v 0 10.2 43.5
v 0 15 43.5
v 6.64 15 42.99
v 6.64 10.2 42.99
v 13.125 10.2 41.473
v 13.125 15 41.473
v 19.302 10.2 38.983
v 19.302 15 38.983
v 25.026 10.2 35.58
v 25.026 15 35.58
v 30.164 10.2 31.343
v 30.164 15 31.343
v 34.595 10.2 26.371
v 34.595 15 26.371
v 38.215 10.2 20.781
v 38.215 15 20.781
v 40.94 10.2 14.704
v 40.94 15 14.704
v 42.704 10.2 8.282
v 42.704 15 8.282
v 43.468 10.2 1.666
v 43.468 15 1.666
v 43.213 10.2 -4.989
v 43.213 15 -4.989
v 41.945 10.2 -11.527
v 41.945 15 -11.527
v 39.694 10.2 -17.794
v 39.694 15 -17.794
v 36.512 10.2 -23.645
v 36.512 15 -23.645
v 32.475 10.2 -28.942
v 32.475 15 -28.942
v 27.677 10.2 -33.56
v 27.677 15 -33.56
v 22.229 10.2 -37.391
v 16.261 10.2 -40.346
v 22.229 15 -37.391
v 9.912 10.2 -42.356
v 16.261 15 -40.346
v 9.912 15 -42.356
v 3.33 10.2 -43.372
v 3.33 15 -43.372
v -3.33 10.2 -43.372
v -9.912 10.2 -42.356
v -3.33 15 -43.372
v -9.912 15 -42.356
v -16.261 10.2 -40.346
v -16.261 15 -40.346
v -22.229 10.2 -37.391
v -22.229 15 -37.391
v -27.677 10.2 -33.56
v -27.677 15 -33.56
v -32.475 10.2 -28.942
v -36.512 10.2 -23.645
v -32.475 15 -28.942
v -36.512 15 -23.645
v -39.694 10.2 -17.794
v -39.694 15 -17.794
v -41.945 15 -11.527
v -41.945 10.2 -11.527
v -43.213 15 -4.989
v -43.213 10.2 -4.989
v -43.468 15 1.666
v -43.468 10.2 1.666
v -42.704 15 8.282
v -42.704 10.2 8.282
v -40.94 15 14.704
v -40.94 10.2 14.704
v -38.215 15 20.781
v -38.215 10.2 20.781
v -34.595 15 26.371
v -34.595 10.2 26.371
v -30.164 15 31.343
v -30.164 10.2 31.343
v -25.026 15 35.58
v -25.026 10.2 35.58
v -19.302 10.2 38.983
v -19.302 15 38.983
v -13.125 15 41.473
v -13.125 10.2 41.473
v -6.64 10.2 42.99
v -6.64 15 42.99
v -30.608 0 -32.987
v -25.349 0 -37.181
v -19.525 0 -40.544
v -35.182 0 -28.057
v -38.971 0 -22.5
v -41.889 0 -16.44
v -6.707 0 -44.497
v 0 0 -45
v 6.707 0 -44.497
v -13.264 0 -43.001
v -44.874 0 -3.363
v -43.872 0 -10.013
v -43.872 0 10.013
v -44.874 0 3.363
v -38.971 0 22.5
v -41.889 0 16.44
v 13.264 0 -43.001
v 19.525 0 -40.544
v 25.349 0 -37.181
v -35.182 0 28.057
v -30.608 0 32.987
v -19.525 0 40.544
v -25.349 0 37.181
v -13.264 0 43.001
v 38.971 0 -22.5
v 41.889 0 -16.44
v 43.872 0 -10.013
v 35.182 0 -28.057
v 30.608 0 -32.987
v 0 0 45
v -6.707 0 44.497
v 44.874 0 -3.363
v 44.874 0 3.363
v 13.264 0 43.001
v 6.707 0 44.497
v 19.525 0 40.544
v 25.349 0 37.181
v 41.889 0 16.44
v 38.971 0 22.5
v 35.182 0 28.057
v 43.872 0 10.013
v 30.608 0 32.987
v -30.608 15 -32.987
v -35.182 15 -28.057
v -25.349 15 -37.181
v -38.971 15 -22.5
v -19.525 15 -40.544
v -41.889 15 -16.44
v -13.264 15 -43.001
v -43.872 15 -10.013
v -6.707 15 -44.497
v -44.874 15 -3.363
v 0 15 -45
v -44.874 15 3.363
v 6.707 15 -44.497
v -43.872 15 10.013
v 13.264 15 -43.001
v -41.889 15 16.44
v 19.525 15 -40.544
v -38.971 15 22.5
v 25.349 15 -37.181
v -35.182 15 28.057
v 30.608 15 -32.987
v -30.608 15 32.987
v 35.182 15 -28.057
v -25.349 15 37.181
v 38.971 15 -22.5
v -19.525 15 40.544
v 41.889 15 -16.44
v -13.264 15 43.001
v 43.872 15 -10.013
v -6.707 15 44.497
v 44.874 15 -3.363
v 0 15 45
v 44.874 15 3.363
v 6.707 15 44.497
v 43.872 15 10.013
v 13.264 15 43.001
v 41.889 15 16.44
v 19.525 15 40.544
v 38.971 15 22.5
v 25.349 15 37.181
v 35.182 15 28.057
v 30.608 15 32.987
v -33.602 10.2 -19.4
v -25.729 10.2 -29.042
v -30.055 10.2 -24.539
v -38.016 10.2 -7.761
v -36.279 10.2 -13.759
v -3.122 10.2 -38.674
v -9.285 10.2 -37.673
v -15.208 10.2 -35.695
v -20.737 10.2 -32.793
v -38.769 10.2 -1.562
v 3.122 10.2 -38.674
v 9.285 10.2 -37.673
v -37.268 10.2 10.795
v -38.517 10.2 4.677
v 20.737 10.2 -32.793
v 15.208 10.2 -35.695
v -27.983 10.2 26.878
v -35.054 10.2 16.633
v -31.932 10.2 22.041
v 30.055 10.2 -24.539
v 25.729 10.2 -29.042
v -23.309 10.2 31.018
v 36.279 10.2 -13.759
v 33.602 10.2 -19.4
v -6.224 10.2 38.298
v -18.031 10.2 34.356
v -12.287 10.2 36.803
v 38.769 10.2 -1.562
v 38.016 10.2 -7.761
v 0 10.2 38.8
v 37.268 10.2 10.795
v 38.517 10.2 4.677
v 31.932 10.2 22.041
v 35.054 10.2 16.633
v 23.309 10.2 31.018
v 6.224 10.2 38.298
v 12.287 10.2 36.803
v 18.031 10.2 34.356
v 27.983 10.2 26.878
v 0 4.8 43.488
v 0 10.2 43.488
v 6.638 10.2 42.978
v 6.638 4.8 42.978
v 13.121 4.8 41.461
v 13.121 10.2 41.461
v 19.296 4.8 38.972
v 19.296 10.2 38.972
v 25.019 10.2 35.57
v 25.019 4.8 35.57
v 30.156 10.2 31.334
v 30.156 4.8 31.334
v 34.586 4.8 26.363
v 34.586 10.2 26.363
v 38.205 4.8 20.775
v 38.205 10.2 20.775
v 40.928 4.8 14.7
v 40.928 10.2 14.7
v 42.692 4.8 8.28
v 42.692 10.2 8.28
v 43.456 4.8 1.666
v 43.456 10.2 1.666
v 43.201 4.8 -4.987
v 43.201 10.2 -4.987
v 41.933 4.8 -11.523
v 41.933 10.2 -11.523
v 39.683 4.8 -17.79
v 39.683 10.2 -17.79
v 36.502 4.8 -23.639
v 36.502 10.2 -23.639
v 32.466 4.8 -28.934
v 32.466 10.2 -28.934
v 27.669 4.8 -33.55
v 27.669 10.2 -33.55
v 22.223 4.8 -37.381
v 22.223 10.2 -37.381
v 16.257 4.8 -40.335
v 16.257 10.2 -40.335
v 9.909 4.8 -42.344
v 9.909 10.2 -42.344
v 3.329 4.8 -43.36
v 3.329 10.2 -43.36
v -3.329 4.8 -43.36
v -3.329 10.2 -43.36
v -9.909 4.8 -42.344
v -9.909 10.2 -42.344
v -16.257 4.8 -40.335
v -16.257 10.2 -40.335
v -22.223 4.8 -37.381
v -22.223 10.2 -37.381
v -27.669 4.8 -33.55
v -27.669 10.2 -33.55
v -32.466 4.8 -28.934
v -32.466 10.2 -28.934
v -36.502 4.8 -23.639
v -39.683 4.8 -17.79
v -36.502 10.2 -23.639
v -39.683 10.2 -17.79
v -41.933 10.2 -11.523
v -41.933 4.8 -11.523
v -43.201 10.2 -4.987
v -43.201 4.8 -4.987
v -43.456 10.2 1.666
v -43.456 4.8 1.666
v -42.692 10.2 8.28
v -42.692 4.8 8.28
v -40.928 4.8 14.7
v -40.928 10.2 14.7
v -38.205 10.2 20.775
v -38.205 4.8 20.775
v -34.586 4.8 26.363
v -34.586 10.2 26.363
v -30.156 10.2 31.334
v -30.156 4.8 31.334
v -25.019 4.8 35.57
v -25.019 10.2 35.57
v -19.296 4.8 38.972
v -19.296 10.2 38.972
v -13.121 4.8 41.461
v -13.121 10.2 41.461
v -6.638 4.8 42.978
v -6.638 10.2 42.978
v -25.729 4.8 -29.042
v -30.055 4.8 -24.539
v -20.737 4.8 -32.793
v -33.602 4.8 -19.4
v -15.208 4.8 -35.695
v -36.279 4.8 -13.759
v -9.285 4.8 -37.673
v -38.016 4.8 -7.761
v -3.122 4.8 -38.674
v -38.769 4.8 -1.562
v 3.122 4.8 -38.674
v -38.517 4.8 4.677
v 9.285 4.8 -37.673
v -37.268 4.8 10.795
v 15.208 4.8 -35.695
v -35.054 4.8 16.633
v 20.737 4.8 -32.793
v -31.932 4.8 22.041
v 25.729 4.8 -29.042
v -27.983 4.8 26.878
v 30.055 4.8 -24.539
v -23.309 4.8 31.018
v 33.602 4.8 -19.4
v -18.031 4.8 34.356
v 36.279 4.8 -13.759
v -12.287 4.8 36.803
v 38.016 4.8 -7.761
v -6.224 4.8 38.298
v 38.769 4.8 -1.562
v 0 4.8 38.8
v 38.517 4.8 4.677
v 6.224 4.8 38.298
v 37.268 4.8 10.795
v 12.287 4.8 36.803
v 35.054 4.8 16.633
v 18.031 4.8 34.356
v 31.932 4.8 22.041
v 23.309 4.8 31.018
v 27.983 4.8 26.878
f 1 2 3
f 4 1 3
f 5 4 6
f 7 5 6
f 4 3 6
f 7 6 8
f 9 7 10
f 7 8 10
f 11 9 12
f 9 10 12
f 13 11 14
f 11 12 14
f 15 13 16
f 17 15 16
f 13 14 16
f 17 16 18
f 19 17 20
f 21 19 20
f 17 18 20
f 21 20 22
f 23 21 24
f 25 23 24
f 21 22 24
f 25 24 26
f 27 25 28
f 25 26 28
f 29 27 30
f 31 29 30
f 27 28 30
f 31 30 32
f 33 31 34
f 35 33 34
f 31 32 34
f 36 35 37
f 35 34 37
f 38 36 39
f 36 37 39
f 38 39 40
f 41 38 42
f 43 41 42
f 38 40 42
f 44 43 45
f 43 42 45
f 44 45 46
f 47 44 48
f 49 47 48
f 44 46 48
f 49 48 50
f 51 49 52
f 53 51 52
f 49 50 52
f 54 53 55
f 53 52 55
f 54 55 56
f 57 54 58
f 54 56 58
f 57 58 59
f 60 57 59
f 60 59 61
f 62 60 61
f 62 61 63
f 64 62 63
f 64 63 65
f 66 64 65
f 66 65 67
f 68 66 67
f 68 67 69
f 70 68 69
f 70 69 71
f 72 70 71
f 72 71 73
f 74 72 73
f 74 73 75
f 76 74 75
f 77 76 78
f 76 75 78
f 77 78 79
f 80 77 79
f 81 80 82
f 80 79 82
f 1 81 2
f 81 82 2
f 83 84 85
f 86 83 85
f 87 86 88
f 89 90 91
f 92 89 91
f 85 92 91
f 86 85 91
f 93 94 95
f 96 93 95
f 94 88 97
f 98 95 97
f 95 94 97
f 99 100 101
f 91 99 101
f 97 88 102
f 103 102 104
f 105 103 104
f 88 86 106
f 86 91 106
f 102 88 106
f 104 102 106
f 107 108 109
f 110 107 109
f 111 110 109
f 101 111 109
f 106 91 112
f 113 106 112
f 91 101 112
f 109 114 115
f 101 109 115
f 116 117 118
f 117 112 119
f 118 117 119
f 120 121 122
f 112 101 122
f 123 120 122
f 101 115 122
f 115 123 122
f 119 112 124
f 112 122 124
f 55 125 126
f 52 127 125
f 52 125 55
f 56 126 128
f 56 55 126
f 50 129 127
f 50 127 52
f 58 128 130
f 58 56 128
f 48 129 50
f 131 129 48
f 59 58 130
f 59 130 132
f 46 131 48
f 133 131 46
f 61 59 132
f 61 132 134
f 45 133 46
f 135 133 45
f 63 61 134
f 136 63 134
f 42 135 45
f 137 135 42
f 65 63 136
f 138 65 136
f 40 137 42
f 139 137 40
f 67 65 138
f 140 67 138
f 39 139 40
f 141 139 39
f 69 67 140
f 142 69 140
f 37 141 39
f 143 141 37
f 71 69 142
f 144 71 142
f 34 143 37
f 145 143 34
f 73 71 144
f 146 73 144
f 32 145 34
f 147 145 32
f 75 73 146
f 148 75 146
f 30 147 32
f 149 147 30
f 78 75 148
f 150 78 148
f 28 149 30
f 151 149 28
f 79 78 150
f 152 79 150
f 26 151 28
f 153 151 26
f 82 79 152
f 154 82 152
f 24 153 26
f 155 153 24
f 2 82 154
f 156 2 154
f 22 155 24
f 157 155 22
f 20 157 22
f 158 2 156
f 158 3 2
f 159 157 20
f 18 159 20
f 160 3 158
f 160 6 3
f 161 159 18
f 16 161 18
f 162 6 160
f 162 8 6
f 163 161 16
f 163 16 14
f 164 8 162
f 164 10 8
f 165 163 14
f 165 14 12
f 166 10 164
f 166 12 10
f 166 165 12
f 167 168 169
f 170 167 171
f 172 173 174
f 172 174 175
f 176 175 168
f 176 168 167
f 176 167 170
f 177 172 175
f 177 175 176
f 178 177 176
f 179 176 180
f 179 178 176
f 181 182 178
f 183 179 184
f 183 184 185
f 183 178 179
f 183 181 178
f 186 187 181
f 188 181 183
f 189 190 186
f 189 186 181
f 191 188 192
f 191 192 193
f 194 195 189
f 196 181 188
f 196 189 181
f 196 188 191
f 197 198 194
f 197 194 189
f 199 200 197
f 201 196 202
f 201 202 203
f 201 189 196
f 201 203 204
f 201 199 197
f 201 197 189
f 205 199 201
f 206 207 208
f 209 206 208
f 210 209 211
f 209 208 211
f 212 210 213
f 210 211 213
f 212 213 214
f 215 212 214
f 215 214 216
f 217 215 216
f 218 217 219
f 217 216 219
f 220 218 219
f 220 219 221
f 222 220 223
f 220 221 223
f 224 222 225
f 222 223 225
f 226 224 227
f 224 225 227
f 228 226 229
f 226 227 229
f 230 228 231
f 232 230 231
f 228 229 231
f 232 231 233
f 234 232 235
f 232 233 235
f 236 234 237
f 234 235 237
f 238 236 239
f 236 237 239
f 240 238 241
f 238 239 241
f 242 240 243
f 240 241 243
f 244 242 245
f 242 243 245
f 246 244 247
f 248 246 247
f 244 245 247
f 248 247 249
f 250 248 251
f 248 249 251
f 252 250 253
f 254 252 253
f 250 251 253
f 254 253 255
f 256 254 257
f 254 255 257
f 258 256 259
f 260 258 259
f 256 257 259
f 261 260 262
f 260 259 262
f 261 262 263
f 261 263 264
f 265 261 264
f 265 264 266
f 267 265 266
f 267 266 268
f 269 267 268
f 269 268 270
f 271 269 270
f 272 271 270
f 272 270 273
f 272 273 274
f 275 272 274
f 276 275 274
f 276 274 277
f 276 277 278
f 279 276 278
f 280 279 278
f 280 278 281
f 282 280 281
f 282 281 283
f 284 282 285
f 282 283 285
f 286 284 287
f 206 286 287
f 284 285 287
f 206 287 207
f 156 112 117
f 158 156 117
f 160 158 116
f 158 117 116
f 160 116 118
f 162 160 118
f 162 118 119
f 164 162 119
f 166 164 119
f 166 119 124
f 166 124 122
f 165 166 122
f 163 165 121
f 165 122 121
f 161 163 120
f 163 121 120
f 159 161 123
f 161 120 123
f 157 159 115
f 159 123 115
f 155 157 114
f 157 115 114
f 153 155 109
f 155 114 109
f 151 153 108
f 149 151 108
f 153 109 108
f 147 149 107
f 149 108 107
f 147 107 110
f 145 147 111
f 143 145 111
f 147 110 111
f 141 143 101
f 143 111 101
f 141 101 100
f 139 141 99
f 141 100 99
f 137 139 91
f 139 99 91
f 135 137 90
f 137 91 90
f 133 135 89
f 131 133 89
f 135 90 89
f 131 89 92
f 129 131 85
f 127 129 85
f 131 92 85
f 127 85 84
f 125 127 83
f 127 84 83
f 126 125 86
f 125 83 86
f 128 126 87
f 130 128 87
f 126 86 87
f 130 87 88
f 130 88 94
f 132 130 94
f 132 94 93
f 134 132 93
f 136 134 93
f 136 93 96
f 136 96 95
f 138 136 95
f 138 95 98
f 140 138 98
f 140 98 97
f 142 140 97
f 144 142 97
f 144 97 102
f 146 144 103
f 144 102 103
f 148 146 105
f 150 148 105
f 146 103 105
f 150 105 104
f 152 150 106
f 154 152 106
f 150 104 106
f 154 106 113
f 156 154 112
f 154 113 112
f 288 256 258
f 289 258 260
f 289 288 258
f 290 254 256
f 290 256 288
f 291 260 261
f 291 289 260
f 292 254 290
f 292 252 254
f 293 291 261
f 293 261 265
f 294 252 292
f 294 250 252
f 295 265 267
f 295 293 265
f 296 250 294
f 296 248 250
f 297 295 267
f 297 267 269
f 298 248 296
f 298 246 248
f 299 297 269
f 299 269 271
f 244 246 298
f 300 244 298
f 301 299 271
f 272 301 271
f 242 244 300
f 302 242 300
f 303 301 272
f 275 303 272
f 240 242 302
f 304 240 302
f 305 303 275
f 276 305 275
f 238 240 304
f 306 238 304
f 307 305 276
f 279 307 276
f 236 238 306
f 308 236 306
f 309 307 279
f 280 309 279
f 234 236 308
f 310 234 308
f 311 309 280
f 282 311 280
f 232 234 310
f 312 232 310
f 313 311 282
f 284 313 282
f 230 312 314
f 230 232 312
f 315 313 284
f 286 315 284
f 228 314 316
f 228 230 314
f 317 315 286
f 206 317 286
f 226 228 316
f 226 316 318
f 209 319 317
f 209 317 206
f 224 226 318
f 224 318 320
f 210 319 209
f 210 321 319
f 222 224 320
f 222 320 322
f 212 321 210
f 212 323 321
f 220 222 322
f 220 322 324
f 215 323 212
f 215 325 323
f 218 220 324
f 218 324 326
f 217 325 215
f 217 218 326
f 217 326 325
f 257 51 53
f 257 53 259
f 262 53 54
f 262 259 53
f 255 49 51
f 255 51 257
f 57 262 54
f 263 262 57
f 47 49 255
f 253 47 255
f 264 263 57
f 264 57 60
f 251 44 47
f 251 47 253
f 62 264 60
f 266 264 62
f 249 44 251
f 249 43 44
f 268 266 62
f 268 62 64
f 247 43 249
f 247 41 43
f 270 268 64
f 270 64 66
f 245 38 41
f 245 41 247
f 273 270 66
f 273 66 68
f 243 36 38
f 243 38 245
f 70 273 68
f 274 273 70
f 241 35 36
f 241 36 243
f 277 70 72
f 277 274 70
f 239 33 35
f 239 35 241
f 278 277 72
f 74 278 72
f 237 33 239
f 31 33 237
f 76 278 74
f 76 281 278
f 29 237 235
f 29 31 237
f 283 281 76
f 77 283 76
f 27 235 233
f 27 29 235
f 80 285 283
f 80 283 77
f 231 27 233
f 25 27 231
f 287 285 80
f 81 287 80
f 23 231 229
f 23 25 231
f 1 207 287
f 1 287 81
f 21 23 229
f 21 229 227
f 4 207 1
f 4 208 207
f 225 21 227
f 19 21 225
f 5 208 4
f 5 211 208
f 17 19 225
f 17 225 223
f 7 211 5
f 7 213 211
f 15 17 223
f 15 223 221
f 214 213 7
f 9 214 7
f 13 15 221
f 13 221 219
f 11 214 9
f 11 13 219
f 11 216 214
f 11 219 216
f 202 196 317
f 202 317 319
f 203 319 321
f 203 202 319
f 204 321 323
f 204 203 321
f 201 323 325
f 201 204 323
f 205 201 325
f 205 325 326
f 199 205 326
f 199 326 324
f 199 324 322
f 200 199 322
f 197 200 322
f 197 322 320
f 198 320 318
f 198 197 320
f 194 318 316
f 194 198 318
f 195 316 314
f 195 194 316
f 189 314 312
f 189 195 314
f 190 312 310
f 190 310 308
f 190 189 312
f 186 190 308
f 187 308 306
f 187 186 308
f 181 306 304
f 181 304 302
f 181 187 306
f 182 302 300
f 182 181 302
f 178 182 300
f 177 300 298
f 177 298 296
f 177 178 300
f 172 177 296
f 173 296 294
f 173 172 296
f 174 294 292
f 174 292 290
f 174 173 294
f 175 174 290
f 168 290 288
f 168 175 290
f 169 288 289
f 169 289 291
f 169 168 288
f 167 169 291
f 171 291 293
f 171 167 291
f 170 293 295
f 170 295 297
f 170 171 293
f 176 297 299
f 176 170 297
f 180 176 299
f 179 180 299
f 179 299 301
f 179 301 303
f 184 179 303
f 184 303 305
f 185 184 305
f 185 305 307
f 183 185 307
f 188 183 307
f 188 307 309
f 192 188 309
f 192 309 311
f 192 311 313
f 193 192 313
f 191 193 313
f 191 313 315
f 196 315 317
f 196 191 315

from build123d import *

# Parameters (mm, degrees)
SKETCH1_R           = 45
BOSS_EXTRUDE1_DEPTH = 15
SKETCH2_R           = 43.5
CUT_EXTRUDE1_DEPTH  = 4.8
SKETCH3_R           = 43.487927738
SKETCH3_R_2         = 38.8
CUT_EXTRUDE2_DEPTH  = 5.4


with BuildPart() as part:
    # Sketch1 → Boss-Extrude1 (new body)
    with BuildSketch(Plane(origin=(0, 0, 0), x_dir=(1, 0, 0), z_dir=(0, 1, 0))):
        with Locations(Location((0, 0, 0), (0, 0, 270))):
            Circle(SKETCH1_R)
    extrude(amount=BOSS_EXTRUDE1_DEPTH)

    # Sketch2 → Cut-Extrude1 (cut)
    with BuildSketch(Plane(origin=(0, 15, 0), x_dir=(1, 0, 0), z_dir=(0, 1, 0))):
        with Locations(Location((0, 0, 0), (0, 0, 270))):
            Circle(SKETCH2_R)
    extrude(amount=-CUT_EXTRUDE1_DEPTH, mode=Mode.SUBTRACT)

    # Sketch3 → Cut-Extrude2 (cut)
    with BuildSketch(Plane(origin=(0, 10.2, 0), x_dir=(1, 0, 0), z_dir=(0, 1, 0))):
        with Locations(Location((0, 0, 0), (0, 0, 270))):
            Circle(SKETCH3_R)
        with Locations(Location((0, 0, 0), (0, 0, 270))):
            Circle(SKETCH3_R_2, mode=Mode.SUBTRACT)
    extrude(amount=-CUT_EXTRUDE2_DEPTH, mode=Mode.SUBTRACT)


solid = part.part
